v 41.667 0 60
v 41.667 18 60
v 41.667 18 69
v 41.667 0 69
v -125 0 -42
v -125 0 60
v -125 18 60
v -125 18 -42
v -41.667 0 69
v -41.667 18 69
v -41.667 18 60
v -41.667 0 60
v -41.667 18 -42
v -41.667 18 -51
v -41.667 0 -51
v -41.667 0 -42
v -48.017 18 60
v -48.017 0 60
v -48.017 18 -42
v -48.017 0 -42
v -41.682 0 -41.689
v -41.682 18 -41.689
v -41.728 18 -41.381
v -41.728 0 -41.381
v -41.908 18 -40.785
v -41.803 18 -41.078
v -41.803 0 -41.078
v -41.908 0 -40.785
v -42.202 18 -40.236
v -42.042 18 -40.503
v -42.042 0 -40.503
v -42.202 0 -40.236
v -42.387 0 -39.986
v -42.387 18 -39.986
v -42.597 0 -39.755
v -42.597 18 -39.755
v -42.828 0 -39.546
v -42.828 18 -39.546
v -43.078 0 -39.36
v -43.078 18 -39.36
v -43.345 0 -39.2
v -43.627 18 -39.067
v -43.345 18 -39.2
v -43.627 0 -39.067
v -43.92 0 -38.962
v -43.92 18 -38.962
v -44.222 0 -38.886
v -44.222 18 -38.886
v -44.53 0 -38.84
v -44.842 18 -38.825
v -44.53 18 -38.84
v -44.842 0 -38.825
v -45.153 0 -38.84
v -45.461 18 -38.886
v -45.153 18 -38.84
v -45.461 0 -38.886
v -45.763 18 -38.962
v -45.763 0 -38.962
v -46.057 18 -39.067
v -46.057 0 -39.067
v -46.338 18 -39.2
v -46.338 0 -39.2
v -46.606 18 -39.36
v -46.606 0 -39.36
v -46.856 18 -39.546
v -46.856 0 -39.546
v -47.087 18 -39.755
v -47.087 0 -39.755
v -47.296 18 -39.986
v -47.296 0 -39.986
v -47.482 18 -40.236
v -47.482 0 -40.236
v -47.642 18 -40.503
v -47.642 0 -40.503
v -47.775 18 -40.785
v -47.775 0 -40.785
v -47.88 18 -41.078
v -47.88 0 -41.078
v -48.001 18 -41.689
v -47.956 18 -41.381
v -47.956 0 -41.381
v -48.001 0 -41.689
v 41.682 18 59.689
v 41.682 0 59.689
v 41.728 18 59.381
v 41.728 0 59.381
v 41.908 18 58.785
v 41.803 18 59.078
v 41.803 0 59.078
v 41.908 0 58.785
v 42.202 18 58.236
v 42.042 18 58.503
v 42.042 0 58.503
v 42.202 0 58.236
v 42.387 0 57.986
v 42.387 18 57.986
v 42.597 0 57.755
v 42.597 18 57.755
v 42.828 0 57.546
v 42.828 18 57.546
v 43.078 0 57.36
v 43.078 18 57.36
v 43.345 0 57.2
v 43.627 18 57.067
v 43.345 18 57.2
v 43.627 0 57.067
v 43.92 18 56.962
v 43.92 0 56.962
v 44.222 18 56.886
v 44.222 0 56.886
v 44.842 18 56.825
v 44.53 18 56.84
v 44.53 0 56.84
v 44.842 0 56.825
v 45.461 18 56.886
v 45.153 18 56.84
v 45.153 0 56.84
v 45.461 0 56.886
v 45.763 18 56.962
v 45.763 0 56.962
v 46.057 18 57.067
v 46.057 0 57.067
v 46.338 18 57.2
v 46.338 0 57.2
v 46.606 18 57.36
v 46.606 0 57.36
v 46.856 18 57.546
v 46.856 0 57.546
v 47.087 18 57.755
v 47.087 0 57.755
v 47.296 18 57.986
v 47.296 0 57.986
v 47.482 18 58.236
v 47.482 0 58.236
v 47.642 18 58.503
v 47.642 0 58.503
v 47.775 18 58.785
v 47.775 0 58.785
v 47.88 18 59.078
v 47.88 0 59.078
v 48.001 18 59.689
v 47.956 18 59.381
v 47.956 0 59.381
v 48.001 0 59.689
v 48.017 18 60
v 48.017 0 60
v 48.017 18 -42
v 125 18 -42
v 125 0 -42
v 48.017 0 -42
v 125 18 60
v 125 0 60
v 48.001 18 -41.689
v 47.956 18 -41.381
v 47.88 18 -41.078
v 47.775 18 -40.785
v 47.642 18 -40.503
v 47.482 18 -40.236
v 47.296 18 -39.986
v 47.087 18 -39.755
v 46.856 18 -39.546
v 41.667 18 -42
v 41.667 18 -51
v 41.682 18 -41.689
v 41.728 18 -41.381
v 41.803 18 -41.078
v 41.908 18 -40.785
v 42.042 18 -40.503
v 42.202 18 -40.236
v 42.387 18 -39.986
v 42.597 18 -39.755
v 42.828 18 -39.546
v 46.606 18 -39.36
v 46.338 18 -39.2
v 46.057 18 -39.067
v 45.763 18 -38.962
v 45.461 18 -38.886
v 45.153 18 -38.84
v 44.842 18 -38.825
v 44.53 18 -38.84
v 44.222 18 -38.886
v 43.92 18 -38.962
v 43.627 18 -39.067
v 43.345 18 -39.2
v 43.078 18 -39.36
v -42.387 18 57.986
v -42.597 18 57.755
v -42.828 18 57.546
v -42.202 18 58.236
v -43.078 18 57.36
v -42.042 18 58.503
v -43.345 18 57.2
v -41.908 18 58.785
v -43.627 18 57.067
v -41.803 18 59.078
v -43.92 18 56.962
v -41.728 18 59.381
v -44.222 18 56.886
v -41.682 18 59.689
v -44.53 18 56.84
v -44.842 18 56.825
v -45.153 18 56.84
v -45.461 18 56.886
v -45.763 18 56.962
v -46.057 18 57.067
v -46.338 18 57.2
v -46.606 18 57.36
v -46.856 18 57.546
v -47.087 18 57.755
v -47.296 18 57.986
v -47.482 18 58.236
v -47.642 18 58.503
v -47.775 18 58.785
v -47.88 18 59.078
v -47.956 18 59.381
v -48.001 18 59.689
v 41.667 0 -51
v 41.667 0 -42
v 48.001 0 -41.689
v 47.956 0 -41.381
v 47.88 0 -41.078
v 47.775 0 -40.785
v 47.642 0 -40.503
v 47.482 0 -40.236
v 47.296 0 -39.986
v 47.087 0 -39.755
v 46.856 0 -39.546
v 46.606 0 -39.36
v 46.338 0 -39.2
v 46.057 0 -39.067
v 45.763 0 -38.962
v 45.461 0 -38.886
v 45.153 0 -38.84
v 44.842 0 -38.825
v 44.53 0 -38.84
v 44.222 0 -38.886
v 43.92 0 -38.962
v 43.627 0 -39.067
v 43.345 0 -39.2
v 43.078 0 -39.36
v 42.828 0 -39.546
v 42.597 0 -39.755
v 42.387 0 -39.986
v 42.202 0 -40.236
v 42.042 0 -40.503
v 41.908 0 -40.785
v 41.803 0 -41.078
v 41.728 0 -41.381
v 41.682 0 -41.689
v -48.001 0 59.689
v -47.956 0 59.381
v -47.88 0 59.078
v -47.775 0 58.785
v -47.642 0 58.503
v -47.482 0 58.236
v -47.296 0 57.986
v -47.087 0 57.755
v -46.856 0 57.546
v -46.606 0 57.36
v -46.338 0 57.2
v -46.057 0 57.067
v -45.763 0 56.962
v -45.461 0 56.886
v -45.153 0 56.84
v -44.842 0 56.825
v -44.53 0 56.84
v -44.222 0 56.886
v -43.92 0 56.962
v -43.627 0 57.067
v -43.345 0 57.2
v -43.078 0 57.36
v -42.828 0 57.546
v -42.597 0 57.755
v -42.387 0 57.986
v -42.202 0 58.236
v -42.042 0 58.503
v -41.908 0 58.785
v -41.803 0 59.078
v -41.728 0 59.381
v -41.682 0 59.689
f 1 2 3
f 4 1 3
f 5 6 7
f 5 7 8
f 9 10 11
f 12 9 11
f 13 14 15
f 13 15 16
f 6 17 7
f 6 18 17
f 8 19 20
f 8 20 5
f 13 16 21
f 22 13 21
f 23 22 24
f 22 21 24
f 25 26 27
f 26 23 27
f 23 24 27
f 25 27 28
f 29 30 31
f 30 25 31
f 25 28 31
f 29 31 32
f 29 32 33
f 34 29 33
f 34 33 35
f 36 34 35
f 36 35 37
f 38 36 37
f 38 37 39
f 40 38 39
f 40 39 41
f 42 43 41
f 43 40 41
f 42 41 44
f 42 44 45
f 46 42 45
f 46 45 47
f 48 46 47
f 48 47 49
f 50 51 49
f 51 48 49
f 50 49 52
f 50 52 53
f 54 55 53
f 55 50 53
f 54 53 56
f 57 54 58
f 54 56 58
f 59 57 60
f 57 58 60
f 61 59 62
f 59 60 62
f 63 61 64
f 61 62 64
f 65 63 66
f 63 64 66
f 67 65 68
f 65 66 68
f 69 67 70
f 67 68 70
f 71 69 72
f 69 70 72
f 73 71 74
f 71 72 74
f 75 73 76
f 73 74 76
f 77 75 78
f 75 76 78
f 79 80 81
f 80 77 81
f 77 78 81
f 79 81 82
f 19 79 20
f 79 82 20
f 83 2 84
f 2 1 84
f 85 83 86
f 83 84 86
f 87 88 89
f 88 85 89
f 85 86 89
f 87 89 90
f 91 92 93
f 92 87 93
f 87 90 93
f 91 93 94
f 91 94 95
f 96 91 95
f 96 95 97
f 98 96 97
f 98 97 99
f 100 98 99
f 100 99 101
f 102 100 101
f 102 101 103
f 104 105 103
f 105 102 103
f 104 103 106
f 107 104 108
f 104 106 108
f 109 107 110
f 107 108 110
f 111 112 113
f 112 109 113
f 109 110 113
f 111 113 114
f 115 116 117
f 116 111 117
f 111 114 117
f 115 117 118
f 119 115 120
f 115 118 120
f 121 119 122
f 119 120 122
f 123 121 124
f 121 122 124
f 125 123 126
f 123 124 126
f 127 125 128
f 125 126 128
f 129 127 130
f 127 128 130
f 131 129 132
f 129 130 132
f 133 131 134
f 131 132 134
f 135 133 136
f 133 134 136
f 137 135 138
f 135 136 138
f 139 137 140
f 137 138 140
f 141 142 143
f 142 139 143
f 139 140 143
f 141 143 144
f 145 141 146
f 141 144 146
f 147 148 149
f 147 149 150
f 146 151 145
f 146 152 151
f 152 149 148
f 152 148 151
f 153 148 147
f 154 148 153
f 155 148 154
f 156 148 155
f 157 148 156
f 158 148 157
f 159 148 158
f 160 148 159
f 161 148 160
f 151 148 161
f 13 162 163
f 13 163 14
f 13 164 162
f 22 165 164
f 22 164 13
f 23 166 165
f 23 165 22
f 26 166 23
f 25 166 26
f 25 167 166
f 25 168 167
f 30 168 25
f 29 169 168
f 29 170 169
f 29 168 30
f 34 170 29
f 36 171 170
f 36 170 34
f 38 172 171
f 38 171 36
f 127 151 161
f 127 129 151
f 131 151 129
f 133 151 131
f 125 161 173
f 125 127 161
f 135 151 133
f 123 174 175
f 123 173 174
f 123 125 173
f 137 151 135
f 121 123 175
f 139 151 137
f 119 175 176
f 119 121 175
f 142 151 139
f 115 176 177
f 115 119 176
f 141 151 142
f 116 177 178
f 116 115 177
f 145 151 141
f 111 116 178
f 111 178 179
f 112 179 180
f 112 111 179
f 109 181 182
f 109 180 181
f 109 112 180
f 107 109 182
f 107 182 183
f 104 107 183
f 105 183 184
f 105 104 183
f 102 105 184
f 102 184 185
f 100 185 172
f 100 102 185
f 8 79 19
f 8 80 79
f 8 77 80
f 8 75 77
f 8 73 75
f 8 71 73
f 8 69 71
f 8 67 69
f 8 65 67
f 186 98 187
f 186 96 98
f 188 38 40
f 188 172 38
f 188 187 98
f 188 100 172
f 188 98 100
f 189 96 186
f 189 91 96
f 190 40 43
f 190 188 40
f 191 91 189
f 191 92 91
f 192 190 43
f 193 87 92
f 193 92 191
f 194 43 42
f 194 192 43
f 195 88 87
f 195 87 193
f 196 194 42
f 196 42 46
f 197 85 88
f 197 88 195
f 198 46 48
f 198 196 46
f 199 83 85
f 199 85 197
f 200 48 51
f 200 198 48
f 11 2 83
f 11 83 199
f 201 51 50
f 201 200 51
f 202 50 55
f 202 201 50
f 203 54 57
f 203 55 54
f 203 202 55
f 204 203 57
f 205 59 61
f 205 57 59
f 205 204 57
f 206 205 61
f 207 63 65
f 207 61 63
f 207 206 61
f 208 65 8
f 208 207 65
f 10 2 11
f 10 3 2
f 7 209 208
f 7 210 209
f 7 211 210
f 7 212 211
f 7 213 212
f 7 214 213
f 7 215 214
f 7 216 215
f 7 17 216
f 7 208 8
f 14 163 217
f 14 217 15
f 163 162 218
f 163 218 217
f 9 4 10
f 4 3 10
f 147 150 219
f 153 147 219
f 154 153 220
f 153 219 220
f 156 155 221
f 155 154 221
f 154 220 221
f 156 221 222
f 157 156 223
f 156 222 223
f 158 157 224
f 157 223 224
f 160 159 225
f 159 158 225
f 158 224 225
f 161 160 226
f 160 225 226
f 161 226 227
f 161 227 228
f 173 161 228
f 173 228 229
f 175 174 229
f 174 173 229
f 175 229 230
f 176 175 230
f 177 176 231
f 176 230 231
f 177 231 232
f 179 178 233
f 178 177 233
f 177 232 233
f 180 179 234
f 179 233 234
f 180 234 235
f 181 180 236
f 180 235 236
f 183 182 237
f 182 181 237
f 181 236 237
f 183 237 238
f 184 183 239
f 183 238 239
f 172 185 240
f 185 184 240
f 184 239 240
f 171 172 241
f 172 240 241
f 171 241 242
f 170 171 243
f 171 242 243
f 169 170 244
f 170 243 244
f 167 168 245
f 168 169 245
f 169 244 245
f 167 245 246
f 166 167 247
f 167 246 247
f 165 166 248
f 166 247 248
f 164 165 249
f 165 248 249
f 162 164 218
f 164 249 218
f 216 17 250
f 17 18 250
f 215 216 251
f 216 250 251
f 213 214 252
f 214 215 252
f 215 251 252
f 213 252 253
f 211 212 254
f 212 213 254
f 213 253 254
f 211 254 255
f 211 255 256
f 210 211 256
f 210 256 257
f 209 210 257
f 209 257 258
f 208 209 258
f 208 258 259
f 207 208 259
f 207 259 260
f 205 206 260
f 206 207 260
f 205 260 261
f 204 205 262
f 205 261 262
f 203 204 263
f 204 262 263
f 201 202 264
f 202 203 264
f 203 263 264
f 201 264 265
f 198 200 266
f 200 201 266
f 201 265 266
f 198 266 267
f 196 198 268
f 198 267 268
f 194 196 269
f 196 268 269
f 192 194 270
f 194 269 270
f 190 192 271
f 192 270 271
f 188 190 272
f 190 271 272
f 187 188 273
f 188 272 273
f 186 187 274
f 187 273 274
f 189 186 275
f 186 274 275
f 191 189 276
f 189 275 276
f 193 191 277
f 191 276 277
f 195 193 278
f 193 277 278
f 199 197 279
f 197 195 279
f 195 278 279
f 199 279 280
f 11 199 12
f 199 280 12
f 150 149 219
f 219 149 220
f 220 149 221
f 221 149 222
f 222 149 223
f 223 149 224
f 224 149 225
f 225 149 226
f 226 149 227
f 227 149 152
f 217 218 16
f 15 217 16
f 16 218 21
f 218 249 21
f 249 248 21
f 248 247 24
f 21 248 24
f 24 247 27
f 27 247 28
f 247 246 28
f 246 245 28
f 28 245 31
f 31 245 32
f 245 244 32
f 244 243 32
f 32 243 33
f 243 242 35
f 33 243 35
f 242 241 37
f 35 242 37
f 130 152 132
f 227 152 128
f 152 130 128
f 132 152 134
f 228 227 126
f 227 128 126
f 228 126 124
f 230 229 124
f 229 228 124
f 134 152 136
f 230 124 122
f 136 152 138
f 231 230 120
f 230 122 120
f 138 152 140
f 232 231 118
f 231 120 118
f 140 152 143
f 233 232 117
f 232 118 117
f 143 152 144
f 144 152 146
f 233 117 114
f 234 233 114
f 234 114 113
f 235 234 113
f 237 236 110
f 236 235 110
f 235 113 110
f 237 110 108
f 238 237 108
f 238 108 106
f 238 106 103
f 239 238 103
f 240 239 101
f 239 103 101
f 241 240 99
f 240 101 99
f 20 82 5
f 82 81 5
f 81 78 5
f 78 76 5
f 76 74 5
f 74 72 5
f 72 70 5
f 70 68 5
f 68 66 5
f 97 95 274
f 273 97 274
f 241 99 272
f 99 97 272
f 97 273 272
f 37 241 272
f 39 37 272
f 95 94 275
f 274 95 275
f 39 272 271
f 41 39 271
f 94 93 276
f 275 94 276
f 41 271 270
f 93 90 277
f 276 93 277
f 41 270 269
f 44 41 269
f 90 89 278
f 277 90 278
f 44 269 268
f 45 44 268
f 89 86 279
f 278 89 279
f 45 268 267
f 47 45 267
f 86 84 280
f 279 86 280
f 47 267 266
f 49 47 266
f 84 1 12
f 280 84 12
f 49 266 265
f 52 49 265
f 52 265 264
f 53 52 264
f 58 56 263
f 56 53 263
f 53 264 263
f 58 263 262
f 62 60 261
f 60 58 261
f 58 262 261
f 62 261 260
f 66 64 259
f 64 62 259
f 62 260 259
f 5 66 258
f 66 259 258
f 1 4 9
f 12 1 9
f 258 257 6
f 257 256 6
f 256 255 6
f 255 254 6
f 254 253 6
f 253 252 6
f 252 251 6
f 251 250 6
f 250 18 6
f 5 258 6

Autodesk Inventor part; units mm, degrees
sketch "Sketch2" plane through (0, 0, 0) normal (0, 1, 0) x (-1, 0, 0)
  line L0 (125, -60) -> (-125, -60)
  line L1 (-125, -60) -> (-125, 60)
  line L2 (-125, 60) -> (125, 60)
  line L3 (125, 60) -> (125, -60)
  point P0 (0, 0)
  point P1 (-125, 0)
  point P2 (0, -60)
  dimension "d2" = 250
  dimension "d3" = 120
extrude "Extrusion1" add sketch "Sketch2" along normal blind 18
sketch "Sketch3" plane through (0, 18, 0) normal (0, 1, 0) x (1, 0, 0)
  line L0 (-125, 60) -> (-41.6667, 60)
  line L1 (-41.6667, 60) -> (-41.6667, 42)
  line L2 (-41.6667, 42) -> (-125, 42)
  line L3 (-125, 42) -> (-125, 60)
  line L4 (125, 60) -> (-125, 60) projected
  line L5 (-125, 60) -> (-125, -60) projected
  line L6 (-125, -60) -> (125, -60) projected
  line L7 (125, -60) -> (125, 60) projected
  point P0 (0, 0)
  point P1 (-125, 51)
  point P2 (-125, 0)
  point P3 (-83.3333, 60)
  point P4 (0, 60)
  dimension "d6" = 83.3333
  dimension "d7" = 18
extrude "Extrusion2" cut sketch "Sketch3" against normal blind 18 contours L0 L1 L2 L3
ref_plane "Work Plane1" through (0, 0, 60) normal (-1, 0, 0) x (0, 0, 1)
ref_plane "Work Plane2" through (125, 0, 0) normal (0, 0, -1) x (-1, 0, 0)
mirror "Mirror1" about plane through (0, 0, 60) normal (-1, 0, 0) of "Extrusion2"
sketch "Sketch4" plane through (0, 18, 0) normal (0, 1, 0) x (1, 0, 0)
  line L0 (-41.6667, 60) -> (41.6667, 60)
  line L1 (41.6667, 60) -> (41.6667, 51)
  line L2 (41.6667, 51) -> (-41.6667, 51)
  line L3 (-41.6667, 51) -> (-41.6667, 60)
  line L4 (41.6667, 42) -> (41.6667, 60) projected
  line L5 (41.6667, 60) -> (-41.6667, 60) projected
  line L6 (-41.6667, 60) -> (-41.6667, 42) projected
  line L7 (-41.6667, 42) -> (-125, 42) projected
  line L8 (-125, 42) -> (-125, -60) projected
  line L9 (-125, -60) -> (125, -60) projected
  line L10 (125, -60) -> (125, 42) projected
  line L11 (125, 42) -> (41.6667, 42) projected
  line L12 (-41.6667, 60) -> (-41.6667, 42) projected
  point P0 (0, 0)
  point P1 (0, 60)
  point P2 (0, 60)
  point P3 (0, 51)
  point P4 (-41.6667, 51)
  point P5 (41.6667, 55.5)
  point P6 (41.6667, 51)
  point P7 (-41.6667, 55.5)
  point P8 (-41.6667, 51)
extrude "Extrusion3" cut sketch "Sketch4" against normal blind 18 contours L0 L1 L2 L3
sketch "Sketch5" plane through (0, 18, 0) normal (0, 1, 0) x (1, 0, 0)
  line L0 (-41.6667, -60) -> (41.6667, -60)
  line L1 (41.6667, -60) -> (41.6667, -69)
  line L2 (41.6667, -69) -> (-41.6667, -69)
  line L3 (-41.6667, -69) -> (-41.6667, -60)
  line L4 (41.6667, 51) -> (-41.6667, 51) projected
  line L5 (-41.6667, 51) -> (-41.6667, 42) projected
  line L6 (-41.6667, 42) -> (-125, 42) projected
  line L7 (-125, 42) -> (-125, -60) projected
  line L8 (-125, -60) -> (125, -60) projected
  line L9 (125, -60) -> (125, 42) projected
  line L10 (125, 42) -> (41.6667, 42) projected
  line L11 (41.6667, 42) -> (41.6667, 51) projected
  line L12 (-125, -60) -> (125, -60) projected
  point P0 (0, 0)
  point P1 (0, -60)
  point P2 (0, -60)
  point P3 (0, -69)
  point P4 (0, -60)
  dimension "d12" = 83.3333
  dimension "d13" = 9
extrude "Extrusion4" add sketch "Sketch5" against normal blind 18 contours L0 L1 L2 L3
sketch "Sketch6" plane through (0, 18, 0) normal (0, 1, 0) x (1, 0, 0)
  line L0 (-41.6667, 51) -> (-41.6667, 42) projected
  line L1 (41.6667, 51) -> (41.6667, 42) projected
  point P0 (0, 0)
  point P1 (-44.8417, 42)
  point P2 (44.8417, 42)
  dimension "d16" = 3.175
  dimension "d17" = 3.175
hole "Hole1" at (-44.8417, 18, -42) at (44.8417, 18, -42) direction (0, -1, 0) diameter 6.35 end through all
ref_plane "Work Plane3" through (-125, 0, 9) normal (0, 0, -1) x (-1, 0, 0)
mirror "Mirror2" about plane through (-125, 0, 9) normal (0, 0, -1) of "Hole1"
equation "\"d2\" = shelfWidth"
equation "\"d3\" = shelfHeight"
equation "\"d4\" = plyThickness"
equation "\"d6\" = 0.333333 * shelfWidth"
equation "\"d7\" = plyThickness"
equation "\"d8\" = plyThickness"
equation "\"d10\" = plyThickness"
equation "\"d12\" = 0.333333 * shelfWidth"
equation "\"d13\" = 0.5 * plyThickness"
equation "\"d14\" = plyThickness"
equation "\"d16\" = 0.5 * millDiameter"
equation "\"d17\" = 0.5 * millDiameter"
equation "\"d18\" = millDiameter"
equation "\"plyThickness\" = 18"
equation "\"legHeight\" = 702"
equation "\"millDiameter\" = 6.35"
equation "\"legTopTabHeight\" = 18"
equation "\"legTopSlotDepth\" = 49"
equation "\"shelfWidth\" = 250"
equation "\"shelfHeight\" = 120"
properties part number "shelfSide"
